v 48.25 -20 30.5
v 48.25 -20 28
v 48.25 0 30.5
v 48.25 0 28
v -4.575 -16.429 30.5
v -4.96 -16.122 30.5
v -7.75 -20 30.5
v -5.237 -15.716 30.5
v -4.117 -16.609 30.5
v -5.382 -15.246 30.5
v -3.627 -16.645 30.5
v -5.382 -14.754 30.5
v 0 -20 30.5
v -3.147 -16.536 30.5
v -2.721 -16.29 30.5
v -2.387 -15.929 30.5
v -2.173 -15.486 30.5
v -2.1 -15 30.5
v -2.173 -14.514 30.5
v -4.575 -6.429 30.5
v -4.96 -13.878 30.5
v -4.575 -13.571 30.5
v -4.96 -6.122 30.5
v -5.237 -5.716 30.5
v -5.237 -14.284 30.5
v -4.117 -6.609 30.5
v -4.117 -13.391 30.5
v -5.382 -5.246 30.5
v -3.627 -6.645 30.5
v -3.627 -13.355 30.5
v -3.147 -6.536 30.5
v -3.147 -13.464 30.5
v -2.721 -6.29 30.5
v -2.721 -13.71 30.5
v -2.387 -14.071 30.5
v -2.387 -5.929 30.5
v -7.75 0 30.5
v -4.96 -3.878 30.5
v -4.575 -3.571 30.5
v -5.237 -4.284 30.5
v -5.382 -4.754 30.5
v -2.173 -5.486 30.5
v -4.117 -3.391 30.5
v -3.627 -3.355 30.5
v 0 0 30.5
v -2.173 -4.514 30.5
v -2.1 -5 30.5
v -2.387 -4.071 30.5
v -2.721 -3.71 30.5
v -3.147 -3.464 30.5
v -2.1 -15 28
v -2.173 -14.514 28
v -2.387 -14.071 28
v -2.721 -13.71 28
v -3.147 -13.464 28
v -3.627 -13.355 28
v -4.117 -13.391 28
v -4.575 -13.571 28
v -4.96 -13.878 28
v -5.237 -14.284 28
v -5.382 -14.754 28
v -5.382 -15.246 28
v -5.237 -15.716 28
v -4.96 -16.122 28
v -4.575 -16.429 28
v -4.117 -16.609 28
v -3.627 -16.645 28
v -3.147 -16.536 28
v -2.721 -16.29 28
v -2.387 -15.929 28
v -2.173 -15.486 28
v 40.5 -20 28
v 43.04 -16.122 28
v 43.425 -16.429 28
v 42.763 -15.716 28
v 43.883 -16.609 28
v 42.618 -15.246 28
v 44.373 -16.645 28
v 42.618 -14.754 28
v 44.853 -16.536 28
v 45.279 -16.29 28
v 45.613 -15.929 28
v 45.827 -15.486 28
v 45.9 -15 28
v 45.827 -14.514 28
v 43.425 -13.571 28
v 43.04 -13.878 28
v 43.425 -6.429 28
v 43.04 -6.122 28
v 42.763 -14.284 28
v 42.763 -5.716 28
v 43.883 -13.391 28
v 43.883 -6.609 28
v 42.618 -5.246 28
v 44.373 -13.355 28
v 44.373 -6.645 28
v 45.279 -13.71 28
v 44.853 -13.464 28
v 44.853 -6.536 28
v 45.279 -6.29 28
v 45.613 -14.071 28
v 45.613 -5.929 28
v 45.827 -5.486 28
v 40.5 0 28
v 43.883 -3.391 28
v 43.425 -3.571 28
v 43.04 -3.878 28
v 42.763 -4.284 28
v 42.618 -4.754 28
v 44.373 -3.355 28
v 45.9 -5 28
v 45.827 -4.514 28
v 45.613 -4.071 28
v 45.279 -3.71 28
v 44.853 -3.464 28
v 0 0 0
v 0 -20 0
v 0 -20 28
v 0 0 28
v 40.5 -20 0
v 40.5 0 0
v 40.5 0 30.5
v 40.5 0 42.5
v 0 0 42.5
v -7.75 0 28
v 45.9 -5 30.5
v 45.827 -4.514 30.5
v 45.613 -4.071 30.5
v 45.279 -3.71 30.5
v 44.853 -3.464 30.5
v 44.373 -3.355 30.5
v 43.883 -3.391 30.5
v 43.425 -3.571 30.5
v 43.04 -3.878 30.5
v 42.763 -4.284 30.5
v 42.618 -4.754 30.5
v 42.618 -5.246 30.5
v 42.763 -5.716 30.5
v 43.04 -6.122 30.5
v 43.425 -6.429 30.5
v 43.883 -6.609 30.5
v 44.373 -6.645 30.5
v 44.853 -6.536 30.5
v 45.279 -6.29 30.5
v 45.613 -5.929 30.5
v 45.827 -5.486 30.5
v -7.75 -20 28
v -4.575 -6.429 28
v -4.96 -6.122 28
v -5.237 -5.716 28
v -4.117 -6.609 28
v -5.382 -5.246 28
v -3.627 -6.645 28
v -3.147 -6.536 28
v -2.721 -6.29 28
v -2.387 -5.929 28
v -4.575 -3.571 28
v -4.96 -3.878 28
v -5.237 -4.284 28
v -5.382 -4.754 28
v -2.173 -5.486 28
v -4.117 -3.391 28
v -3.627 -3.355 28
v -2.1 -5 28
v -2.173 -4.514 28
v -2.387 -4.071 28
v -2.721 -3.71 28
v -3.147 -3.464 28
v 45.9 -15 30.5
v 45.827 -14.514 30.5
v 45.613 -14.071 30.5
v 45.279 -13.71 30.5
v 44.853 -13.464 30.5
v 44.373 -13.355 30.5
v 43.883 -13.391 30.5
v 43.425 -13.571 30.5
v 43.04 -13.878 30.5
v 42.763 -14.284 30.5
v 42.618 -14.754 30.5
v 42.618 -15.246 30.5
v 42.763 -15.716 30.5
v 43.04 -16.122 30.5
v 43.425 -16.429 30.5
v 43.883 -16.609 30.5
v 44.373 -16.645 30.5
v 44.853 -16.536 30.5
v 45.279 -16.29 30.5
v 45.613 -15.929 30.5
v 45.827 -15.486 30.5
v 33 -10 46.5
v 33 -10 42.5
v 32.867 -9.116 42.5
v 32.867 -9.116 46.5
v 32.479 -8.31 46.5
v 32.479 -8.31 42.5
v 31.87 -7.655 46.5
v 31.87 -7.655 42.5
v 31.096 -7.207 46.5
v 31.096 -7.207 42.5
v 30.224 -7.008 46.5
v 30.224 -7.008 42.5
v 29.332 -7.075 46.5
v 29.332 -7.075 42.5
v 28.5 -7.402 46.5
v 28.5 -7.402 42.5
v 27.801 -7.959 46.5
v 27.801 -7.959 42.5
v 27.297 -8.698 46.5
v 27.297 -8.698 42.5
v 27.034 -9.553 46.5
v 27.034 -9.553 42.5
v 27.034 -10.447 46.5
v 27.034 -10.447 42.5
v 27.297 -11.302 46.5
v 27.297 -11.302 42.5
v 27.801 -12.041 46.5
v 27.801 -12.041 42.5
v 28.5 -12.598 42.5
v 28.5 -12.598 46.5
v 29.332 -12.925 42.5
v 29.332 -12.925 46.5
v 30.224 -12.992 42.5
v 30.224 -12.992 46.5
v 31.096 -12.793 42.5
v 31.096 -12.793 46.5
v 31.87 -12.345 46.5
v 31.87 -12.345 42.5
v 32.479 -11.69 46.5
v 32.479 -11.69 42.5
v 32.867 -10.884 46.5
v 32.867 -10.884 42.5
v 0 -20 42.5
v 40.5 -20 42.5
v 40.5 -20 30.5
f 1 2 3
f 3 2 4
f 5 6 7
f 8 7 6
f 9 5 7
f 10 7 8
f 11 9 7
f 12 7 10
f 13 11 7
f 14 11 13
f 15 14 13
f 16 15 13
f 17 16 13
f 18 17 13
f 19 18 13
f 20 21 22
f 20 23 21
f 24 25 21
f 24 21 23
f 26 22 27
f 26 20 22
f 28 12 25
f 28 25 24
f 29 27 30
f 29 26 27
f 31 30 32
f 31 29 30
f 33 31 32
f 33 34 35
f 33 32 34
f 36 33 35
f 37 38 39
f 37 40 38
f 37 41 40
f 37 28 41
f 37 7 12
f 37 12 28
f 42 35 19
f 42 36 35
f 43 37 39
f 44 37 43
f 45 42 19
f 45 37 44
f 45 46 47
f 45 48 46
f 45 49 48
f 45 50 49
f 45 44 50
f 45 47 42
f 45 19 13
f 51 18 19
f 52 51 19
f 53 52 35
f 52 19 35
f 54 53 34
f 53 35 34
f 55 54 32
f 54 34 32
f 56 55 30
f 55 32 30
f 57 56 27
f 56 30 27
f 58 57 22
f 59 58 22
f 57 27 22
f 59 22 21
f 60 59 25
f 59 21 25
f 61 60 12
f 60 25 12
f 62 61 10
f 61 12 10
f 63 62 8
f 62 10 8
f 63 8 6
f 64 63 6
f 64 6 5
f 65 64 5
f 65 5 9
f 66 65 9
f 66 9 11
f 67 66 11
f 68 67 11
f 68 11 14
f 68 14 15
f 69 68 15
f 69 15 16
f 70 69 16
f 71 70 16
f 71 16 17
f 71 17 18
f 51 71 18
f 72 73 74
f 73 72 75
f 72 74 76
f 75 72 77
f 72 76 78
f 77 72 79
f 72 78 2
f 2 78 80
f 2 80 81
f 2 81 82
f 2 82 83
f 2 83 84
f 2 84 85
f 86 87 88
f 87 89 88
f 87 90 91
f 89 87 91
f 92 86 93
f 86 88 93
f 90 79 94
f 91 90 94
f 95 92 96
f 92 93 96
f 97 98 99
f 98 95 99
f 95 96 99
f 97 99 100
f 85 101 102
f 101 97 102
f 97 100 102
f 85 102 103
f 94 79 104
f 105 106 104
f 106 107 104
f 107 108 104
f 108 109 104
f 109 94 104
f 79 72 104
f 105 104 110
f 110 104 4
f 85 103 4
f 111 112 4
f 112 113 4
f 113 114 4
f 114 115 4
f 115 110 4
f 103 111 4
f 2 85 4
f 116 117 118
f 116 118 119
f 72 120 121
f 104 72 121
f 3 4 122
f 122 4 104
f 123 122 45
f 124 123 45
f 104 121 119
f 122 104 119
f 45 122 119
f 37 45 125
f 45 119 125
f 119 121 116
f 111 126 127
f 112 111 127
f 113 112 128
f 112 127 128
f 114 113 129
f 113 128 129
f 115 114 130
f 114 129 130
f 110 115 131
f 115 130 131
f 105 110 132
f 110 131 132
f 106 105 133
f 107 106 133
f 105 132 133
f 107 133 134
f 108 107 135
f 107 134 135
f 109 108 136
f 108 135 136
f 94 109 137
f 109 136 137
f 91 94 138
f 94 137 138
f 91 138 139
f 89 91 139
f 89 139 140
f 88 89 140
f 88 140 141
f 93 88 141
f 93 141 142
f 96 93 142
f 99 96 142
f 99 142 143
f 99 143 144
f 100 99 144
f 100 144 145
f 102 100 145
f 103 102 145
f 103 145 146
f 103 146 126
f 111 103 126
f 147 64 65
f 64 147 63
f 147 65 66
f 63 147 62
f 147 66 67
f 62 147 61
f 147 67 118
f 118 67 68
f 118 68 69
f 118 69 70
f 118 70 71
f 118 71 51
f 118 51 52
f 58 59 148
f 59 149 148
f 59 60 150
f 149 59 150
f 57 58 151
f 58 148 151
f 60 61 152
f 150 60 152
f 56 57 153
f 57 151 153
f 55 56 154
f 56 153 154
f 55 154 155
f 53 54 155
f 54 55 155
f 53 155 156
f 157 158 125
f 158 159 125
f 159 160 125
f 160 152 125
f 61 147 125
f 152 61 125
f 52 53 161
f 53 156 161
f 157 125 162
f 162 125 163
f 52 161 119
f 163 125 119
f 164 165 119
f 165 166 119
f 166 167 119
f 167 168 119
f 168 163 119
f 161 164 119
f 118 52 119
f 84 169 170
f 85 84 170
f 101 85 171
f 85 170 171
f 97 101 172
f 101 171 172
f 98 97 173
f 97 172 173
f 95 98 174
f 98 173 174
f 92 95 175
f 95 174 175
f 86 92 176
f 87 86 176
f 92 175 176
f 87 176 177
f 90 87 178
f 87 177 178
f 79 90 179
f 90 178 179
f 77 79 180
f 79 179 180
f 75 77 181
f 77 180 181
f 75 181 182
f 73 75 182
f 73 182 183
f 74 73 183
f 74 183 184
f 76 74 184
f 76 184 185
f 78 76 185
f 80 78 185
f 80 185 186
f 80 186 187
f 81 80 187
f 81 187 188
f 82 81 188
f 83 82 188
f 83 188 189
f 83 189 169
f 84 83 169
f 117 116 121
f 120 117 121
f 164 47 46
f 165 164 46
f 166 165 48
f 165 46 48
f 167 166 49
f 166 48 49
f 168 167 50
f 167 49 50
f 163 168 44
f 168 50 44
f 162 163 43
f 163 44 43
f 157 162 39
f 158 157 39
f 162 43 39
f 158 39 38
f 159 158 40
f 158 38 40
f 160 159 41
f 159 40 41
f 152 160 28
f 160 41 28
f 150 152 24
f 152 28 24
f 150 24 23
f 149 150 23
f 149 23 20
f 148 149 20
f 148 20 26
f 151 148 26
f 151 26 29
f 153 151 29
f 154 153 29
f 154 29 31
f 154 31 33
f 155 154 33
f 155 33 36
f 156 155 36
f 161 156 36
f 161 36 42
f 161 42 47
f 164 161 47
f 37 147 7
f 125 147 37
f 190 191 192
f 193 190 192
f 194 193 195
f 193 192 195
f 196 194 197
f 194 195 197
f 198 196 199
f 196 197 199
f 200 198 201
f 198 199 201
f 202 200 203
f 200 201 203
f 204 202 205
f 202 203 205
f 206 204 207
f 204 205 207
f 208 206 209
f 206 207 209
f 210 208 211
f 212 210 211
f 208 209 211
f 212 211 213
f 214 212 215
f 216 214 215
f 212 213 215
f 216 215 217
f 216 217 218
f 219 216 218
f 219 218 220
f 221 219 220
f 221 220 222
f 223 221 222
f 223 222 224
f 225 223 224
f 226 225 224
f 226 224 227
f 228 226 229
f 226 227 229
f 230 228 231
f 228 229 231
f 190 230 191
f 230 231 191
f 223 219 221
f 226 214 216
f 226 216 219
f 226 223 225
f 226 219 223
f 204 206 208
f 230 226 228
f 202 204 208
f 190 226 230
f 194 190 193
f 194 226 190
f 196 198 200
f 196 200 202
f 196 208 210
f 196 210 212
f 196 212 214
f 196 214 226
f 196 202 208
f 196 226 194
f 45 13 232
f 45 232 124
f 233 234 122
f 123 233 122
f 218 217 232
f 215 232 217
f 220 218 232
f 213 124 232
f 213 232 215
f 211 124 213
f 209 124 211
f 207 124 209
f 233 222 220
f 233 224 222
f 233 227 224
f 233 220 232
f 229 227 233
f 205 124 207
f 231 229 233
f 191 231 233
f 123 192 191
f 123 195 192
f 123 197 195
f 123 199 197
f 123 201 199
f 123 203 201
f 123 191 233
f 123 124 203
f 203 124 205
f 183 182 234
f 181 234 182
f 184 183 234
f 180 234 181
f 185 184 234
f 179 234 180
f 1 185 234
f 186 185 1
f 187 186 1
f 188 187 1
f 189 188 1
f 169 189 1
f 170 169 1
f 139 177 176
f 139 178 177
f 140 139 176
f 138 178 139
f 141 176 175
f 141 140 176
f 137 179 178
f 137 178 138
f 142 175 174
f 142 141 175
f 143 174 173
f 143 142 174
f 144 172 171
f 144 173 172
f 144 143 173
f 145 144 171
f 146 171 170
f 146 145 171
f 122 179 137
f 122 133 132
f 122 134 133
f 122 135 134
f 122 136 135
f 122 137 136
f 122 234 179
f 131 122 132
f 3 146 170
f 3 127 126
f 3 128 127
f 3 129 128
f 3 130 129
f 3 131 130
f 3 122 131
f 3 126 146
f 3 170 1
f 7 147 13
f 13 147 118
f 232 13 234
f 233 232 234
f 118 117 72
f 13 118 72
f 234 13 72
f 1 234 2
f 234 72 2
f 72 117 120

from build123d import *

# Parameters (mm, degrees)
SKETCH_1_W          = 40.5
SKETCH_1_H          = 20
EXTRUDE_1_DEPTH     = 28
SKETCH_2_W          = 7.75
SKETCH_2_H          = 20
SKETCH_2_W_2        = 40.5
EXTRUDE_2_DEPTH     = 2.5
SKETCH_3_W          = 40.5
SKETCH_3_H          = 20
EXTRUDE_3_DEPTH     = 12
SKETCH_4_R          = 3
EXTRUDE_4_DEPTH     = 4
SKETCH_5_R          = 1.65
CUT_EXTRUDE_1_DEPTH = 61.483985484


with BuildPart() as part:
    # 草图1 → 凸台-拉伸1 (new body)
    with BuildSketch(Plane.XY):
        with Locations((20.25, -10)):
            Rectangle(SKETCH_1_W, SKETCH_1_H)
    extrude(amount=EXTRUDE_1_DEPTH)

    # 草图2 → 凸台-拉伸2 (add)
    with BuildSketch(Plane.XY.offset(28)):
        with Locations((-3.875, -10)):
            Rectangle(SKETCH_2_W, SKETCH_2_H)
        with Locations((20.25, -10)):
            Rectangle(SKETCH_2_W_2, SKETCH_2_H)
        with Locations((44.375, -10)):
            Rectangle(SKETCH_2_W, SKETCH_2_H)
    extrude(amount=EXTRUDE_2_DEPTH)

    # 草图3 → 凸台-拉伸3 (add)
    with BuildSketch(Plane.XY.offset(30.5)):
        with Locations((20.25, -10)):
            Rectangle(SKETCH_3_W, SKETCH_3_H)
    extrude(amount=EXTRUDE_3_DEPTH)

    # 草图4 → 凸台-拉伸4 (add)
    with BuildSketch(Plane.XY.offset(42.5)):
        with Locations((30, -10)):
            Circle(SKETCH_4_R)
    extrude(amount=EXTRUDE_4_DEPTH)

    # 草图5 → 切除-拉伸1 (cut, through all)
    with BuildSketch(Plane.XY.offset(30.5)):
        with Locations((-3.75, -5)):
            Circle(SKETCH_5_R)
        with Locations((-3.75, -15)):
            Circle(SKETCH_5_R)
        with Locations((44.25, -5)):
            Circle(SKETCH_5_R)
        with Locations((44.25, -15)):
            Circle(SKETCH_5_R)
    extrude(amount=-CUT_EXTRUDE_1_DEPTH, mode=Mode.SUBTRACT)


solid = part.part
